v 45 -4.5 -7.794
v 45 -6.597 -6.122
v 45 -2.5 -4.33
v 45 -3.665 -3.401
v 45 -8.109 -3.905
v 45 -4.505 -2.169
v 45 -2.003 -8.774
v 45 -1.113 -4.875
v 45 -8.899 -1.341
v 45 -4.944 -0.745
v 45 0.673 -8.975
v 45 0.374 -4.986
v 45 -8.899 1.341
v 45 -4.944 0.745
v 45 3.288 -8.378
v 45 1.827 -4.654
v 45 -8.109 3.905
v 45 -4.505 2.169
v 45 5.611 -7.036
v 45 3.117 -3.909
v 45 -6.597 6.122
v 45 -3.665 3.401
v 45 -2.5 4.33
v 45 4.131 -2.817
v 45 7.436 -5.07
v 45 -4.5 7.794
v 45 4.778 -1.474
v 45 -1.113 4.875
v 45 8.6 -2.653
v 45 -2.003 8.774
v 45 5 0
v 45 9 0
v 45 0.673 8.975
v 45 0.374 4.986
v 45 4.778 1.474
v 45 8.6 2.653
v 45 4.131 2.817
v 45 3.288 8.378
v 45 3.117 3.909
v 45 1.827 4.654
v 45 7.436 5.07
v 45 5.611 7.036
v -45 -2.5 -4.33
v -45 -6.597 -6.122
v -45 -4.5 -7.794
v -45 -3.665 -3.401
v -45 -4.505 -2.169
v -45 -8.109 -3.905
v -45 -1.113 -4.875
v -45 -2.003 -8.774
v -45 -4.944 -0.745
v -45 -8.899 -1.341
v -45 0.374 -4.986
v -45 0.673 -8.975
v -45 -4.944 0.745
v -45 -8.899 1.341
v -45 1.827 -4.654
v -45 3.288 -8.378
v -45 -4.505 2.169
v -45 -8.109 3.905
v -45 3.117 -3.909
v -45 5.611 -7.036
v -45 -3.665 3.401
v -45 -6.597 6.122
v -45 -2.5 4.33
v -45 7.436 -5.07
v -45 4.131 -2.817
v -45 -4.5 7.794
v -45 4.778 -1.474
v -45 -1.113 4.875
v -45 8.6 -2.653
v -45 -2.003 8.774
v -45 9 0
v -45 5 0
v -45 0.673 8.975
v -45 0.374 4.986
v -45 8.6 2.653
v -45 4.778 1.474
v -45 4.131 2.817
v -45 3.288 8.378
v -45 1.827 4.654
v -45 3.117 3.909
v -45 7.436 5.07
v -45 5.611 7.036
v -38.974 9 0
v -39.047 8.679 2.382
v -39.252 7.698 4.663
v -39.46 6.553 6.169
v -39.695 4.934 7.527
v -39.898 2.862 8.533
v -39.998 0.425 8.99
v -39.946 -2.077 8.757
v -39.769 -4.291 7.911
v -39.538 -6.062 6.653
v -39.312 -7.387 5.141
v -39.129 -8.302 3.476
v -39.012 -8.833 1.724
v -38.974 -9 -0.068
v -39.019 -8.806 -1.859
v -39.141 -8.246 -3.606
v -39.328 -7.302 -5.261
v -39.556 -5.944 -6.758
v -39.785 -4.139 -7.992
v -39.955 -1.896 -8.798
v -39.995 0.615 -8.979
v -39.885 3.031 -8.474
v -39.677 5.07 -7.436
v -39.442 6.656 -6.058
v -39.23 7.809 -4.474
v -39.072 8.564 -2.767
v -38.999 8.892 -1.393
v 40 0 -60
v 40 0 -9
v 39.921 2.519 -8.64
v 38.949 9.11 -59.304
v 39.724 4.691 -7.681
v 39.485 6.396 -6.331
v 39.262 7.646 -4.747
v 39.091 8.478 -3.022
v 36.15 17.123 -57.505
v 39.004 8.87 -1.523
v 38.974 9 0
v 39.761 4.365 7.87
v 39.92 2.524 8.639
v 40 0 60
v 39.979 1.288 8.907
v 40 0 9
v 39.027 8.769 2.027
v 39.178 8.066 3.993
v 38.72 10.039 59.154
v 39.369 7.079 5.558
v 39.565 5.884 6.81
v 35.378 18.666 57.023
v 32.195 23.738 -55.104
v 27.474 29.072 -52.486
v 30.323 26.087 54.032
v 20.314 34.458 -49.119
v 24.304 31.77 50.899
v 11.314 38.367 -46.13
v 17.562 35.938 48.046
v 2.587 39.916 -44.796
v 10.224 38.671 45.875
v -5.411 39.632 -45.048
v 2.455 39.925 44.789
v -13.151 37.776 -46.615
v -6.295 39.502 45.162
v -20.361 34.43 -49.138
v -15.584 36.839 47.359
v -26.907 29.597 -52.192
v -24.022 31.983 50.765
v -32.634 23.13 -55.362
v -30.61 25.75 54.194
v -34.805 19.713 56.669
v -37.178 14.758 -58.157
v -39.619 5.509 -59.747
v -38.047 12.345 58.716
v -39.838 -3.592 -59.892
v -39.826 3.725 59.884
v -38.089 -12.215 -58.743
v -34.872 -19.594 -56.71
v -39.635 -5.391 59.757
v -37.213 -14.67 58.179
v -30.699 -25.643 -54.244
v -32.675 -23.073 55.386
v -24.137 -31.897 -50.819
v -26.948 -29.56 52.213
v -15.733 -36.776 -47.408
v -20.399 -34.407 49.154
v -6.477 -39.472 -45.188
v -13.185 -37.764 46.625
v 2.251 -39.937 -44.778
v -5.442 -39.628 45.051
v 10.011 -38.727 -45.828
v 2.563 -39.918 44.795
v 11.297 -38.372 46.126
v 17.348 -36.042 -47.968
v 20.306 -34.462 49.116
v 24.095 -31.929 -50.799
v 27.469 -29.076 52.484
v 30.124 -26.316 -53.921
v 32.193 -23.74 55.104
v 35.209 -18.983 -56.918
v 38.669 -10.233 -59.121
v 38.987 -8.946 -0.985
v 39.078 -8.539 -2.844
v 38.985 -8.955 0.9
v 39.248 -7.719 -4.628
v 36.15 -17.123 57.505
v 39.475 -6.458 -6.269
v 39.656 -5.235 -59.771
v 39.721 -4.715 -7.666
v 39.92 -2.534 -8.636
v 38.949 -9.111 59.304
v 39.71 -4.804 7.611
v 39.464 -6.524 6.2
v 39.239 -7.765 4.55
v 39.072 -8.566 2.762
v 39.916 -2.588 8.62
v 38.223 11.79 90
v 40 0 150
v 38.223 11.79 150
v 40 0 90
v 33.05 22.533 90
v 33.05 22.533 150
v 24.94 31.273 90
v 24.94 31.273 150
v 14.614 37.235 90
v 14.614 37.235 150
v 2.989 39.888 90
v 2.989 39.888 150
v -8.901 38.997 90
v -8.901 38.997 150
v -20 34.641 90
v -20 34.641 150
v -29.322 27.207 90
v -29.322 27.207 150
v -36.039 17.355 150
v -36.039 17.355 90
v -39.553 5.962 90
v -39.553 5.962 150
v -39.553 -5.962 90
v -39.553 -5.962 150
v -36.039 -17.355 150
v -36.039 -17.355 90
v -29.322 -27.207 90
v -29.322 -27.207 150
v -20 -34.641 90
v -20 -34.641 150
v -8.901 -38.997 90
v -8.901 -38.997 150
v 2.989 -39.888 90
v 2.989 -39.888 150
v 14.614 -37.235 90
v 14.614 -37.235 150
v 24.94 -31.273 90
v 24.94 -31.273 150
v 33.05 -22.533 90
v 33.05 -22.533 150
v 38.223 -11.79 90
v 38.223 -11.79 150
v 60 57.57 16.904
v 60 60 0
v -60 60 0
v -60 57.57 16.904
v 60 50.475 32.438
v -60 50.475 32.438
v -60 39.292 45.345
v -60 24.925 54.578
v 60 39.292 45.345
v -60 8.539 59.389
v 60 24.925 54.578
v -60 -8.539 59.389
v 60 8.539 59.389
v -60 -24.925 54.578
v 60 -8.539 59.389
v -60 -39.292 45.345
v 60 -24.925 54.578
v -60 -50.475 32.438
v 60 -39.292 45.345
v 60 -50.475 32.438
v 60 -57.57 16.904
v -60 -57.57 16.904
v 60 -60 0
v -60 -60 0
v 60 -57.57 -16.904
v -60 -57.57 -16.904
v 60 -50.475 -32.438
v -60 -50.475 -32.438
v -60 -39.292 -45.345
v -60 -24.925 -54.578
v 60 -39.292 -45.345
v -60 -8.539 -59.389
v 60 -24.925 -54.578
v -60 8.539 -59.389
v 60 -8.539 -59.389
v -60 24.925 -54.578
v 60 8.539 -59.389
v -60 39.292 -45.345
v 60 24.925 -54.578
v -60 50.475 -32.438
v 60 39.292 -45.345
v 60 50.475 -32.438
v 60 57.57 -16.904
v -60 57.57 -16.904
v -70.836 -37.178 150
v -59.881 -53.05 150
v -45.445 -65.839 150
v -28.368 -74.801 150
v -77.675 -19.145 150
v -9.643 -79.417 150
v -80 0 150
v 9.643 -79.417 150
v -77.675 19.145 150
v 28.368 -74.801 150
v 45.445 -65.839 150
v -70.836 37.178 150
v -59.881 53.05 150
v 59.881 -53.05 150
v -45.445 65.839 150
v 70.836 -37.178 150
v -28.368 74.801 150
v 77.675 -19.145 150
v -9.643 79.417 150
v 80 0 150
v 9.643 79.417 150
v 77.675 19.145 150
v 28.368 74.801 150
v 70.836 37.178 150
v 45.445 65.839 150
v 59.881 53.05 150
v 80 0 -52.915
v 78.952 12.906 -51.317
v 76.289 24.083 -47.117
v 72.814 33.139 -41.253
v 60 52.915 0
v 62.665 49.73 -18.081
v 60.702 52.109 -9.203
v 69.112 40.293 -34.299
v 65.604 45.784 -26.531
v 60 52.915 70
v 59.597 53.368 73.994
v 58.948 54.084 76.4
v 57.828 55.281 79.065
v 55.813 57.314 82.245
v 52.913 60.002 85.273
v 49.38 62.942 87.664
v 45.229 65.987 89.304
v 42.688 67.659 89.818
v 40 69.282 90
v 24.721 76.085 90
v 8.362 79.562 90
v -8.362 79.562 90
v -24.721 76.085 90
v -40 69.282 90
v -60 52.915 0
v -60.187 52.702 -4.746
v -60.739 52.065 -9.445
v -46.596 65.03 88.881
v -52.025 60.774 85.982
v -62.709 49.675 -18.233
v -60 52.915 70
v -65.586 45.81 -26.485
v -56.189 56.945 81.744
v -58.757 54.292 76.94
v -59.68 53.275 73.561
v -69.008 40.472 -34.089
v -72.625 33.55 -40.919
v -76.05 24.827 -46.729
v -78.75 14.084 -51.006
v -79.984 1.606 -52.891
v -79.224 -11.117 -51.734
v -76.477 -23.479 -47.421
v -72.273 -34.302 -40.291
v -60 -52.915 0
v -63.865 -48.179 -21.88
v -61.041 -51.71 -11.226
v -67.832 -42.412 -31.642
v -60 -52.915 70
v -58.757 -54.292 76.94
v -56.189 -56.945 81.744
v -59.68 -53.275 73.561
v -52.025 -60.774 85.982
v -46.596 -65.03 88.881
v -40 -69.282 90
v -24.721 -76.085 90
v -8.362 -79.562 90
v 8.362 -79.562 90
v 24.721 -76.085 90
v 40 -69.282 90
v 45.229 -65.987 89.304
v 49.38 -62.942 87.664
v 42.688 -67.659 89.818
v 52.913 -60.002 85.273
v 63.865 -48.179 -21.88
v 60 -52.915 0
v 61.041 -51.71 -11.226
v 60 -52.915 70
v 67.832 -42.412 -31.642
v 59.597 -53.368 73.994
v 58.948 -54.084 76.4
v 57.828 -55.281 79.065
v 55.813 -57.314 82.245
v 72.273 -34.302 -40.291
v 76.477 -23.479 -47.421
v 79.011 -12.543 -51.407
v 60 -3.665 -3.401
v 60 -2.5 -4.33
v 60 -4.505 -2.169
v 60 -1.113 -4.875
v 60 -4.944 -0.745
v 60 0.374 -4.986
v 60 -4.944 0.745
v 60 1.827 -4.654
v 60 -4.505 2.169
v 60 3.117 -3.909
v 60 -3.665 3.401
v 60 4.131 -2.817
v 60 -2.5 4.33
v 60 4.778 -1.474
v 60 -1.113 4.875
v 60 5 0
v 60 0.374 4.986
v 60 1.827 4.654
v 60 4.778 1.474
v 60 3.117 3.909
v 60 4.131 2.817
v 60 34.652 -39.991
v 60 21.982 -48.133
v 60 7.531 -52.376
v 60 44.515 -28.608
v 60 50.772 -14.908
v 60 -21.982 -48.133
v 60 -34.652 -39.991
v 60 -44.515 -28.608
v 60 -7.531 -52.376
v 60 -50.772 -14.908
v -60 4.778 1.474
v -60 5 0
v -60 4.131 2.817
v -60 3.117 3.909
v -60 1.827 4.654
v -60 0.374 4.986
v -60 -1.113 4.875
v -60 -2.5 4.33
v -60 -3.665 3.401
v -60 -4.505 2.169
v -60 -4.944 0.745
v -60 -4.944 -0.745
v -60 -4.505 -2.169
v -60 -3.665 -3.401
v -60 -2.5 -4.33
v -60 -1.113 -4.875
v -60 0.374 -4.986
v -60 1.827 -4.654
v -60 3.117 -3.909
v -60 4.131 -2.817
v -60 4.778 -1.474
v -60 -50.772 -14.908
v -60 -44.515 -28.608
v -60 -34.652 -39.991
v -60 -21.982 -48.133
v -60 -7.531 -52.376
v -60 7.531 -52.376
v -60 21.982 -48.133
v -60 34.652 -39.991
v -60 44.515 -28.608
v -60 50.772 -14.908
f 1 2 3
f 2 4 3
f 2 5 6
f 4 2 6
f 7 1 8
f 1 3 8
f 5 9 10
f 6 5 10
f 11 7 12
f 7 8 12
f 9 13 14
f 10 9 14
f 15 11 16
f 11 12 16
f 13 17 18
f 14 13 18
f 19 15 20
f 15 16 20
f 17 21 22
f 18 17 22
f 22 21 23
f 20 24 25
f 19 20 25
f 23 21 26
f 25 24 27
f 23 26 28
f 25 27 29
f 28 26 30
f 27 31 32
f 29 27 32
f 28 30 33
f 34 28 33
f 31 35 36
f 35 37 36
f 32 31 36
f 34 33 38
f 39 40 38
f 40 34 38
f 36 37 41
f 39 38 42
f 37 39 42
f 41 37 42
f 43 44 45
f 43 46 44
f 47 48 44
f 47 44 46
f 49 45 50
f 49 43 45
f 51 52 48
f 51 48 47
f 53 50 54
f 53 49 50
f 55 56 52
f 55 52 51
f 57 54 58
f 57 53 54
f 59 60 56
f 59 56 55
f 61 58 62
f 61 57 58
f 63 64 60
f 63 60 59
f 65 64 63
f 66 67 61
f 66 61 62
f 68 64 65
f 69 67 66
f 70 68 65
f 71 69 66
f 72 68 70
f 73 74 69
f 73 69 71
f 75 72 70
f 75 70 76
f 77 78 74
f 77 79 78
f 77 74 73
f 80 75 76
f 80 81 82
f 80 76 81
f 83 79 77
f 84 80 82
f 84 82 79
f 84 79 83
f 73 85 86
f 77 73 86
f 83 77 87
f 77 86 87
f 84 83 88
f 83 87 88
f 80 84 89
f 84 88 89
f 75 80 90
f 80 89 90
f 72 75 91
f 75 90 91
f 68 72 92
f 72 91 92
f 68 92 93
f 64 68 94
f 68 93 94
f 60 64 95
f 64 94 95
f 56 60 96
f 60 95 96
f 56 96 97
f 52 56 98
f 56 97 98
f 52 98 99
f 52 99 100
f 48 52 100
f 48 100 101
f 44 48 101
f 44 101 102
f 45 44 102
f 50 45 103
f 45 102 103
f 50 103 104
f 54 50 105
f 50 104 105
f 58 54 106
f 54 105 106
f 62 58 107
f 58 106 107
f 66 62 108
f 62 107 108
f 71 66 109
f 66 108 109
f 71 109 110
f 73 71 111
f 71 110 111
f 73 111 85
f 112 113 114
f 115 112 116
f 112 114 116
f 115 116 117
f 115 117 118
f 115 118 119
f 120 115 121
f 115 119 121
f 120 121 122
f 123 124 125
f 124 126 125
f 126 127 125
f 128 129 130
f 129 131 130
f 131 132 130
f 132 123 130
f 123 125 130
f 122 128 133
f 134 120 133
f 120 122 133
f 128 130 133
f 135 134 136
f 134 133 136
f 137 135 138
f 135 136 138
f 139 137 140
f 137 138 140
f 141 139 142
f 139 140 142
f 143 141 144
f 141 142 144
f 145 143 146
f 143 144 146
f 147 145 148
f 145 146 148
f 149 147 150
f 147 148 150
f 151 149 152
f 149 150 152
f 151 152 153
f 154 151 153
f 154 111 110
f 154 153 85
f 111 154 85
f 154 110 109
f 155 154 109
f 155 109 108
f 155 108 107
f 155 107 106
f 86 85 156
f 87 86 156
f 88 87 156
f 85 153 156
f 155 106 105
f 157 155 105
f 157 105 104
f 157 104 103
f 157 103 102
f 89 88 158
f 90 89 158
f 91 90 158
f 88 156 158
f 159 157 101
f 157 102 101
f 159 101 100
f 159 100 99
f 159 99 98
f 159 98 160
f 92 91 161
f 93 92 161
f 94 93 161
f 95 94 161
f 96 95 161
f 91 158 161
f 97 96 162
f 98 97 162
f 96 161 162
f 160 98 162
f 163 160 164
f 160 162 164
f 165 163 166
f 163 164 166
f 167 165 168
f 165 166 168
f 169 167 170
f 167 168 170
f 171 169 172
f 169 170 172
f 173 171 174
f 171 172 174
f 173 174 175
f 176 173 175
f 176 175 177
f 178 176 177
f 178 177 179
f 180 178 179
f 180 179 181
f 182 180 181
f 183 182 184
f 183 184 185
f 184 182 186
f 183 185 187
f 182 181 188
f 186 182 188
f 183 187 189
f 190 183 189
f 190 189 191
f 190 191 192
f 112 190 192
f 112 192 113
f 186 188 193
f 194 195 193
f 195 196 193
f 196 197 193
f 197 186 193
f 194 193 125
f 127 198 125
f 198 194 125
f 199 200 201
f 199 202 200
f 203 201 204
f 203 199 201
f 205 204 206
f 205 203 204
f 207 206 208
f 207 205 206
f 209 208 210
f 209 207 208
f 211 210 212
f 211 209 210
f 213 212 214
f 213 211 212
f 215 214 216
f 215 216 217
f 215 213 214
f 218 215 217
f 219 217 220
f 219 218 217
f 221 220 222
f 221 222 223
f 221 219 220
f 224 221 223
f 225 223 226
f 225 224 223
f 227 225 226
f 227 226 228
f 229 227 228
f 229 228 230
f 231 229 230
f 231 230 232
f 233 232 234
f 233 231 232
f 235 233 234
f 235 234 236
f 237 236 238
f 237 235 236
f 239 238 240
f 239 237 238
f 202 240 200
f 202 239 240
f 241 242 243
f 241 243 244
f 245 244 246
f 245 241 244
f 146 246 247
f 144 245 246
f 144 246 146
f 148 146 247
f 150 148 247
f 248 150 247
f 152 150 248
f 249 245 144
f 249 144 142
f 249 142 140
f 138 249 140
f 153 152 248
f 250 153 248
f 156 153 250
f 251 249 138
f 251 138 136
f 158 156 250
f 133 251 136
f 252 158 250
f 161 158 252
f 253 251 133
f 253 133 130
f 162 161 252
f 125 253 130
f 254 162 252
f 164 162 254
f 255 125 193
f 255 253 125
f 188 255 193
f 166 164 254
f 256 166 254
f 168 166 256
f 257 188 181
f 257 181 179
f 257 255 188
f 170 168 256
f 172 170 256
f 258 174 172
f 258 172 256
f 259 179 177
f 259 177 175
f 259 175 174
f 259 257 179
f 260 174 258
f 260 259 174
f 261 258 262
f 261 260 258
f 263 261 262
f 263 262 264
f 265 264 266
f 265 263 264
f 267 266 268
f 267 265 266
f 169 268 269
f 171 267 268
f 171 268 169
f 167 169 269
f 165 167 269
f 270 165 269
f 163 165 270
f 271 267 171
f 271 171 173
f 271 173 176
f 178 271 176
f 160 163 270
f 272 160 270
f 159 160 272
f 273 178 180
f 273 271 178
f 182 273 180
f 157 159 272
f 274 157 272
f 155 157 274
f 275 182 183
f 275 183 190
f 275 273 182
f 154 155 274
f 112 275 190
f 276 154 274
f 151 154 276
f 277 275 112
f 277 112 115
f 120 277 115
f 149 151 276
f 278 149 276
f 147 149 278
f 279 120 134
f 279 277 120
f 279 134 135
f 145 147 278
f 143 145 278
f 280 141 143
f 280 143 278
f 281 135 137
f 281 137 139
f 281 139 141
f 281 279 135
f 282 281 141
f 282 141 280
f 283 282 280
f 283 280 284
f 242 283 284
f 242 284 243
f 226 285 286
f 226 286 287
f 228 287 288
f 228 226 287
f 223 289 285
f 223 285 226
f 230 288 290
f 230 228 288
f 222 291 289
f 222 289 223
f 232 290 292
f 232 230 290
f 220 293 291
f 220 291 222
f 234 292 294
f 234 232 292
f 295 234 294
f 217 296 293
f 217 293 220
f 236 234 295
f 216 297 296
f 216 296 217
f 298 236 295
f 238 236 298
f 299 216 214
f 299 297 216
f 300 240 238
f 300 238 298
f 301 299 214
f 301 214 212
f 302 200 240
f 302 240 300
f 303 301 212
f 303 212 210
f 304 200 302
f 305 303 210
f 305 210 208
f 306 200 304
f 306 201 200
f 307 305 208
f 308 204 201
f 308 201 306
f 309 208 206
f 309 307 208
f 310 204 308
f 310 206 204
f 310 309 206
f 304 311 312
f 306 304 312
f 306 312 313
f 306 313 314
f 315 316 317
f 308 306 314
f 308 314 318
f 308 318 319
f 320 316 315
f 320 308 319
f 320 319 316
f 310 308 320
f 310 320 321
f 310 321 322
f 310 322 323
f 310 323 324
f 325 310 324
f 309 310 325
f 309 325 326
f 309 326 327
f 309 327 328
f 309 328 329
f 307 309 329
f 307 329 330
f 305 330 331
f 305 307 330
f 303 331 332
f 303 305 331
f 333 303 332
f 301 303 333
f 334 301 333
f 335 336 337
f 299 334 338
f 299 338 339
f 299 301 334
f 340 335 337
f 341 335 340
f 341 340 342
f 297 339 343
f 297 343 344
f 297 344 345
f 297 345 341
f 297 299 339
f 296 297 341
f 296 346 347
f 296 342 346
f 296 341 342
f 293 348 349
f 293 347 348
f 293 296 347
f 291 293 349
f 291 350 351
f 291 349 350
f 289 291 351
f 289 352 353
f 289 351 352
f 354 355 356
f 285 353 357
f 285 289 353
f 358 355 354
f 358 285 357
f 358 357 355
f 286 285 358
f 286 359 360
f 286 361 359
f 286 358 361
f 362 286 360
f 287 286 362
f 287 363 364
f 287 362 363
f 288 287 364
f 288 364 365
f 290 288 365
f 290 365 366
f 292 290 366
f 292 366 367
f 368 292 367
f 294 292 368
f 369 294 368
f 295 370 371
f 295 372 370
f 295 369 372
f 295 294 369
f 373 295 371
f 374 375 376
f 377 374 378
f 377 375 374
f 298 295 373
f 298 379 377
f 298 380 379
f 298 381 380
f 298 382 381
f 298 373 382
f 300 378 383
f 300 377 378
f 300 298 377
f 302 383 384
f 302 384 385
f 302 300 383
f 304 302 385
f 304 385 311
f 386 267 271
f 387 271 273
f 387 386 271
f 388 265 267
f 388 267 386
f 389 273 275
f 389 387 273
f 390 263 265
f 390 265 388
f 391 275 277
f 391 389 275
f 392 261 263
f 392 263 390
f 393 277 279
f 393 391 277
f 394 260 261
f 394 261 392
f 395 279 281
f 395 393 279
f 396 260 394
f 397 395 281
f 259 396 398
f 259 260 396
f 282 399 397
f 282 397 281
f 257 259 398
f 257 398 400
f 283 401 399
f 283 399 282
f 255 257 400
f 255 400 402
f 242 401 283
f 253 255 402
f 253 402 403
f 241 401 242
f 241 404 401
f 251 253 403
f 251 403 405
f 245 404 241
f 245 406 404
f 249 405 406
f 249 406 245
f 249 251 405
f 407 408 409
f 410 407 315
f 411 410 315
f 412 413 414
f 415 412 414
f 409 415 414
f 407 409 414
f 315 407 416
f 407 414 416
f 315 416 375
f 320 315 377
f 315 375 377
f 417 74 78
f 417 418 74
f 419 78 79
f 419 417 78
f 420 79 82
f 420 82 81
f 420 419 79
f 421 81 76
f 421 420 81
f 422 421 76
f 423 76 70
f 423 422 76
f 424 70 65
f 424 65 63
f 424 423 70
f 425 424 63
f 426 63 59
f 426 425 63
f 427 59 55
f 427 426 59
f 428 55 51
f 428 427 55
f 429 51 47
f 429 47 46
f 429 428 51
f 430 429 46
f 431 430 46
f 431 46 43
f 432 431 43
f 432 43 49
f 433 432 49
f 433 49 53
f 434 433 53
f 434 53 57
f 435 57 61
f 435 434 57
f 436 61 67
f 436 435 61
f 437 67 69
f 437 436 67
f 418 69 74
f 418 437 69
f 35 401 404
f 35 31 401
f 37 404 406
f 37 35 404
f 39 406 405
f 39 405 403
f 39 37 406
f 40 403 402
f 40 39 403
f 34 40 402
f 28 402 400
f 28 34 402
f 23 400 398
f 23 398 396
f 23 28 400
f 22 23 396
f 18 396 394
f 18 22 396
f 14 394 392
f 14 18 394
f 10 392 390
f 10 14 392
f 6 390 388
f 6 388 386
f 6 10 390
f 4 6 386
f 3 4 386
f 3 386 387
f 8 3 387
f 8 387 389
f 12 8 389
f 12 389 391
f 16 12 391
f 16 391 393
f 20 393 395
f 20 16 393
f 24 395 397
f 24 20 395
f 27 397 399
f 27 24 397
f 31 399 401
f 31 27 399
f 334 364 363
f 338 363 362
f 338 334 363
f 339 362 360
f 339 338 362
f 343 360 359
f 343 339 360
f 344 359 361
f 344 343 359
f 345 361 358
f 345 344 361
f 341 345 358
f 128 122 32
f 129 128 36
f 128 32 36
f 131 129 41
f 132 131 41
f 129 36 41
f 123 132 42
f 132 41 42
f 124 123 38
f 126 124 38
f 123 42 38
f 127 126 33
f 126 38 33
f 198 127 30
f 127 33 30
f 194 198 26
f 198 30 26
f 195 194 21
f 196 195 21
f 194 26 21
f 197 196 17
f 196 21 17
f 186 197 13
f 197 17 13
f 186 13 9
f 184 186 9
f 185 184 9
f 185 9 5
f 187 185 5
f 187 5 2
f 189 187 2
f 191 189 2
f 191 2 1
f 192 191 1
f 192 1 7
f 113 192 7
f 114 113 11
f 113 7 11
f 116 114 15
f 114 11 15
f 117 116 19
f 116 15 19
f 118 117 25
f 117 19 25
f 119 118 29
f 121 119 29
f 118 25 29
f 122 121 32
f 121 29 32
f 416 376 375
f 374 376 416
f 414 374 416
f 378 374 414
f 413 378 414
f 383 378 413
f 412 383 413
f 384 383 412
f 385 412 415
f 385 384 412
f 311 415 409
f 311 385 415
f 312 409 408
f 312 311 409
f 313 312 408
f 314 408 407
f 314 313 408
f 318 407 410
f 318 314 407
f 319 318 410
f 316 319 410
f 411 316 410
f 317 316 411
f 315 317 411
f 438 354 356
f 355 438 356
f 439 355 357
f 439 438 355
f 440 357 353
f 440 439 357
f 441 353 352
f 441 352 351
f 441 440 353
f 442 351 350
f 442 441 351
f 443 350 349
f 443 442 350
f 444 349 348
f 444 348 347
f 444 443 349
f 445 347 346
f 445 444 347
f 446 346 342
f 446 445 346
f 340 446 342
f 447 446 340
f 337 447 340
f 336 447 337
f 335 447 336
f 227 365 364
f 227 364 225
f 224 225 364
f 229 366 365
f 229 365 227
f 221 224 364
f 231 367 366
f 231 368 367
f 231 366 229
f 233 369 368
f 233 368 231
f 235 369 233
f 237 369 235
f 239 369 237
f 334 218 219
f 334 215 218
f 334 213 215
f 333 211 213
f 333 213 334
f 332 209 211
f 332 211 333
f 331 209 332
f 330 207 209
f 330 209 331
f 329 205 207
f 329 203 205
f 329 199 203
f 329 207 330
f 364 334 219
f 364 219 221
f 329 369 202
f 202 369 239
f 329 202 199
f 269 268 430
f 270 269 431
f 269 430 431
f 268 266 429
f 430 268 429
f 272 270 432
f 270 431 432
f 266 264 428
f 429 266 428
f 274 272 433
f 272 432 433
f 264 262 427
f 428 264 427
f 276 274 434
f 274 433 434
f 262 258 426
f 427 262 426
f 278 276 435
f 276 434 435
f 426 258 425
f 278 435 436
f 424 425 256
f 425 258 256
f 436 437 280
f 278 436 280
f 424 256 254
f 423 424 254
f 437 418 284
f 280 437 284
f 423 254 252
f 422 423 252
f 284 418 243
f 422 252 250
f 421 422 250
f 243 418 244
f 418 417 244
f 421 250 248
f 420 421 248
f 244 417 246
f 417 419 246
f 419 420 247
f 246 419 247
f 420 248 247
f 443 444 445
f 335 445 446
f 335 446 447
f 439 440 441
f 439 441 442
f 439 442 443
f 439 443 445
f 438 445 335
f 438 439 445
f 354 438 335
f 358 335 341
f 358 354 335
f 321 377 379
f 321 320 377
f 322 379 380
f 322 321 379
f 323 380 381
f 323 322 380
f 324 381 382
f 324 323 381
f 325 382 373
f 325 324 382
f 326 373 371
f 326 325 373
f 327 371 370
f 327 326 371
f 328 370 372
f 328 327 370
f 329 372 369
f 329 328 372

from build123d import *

# Parameters (mm, degrees)
F8_R           = 40
F9_DEPTH       = 60
F0_R           = 60
F0_R_2         = 9
F0_R_3         = 5
F1_DEPTH       = 60
F10_DEPTH      = 45
F8_R_2         = 80
F3_DEPTH       = 150
F3_DEPTH_BACK  = 60
F4_W           = 105.8300524426
F4_H           = 30
F11_DEPTH      = 25
F11_DEPTH_BACK = 145
F6_W           = 120
F6_H           = 150
F7_DEPTH       = 105.8300524426
F12_R          = 19.99999


# Not quite as in the source:
# - a fillet or chamfer is up to 0.001 mm smaller than in the source, because OpenCascade refuses the exact size


with BuildPart() as f9:
    # F8 (on Top) → F9 (new body, symmetric)
    with BuildSketch(Plane.XY):
        Circle(F8_R)
    extrude(amount=F9_DEPTH, both=True)


with BuildPart() as f1:
    # F0 (on Right) → F1 (new body, symmetric)
    with BuildSketch(Plane.YZ):
        Circle(F0_R)
        Circle(F0_R_2, mode=Mode.SUBTRACT)
        Circle(F0_R_2)
        Circle(F0_R_3, mode=Mode.SUBTRACT)
    extrude(amount=F1_DEPTH, both=True)

    # F2: cut F9
    add(f9.part, mode=Mode.SUBTRACT)

    # F0 (on Right) → F10 (cut, symmetric)
    with BuildSketch(Plane.YZ):
        Circle(F0_R_2)
        Circle(F0_R_3, mode=Mode.SUBTRACT)
    extrude(amount=F10_DEPTH, both=True, mode=Mode.SUBTRACT)


with BuildPart() as f3:
    # F8 (on Top) → F3 (new body, two sides)
    with BuildSketch(Plane.XY) as f3_sk:
        Circle(F8_R_2)
        Circle(F8_R, mode=Mode.SUBTRACT)
    extrude(amount=F3_DEPTH)
    extrude(f3_sk.sketch, amount=-F3_DEPTH_BACK)


with BuildPart() as f11:
    # F4 (on face) → F11 (new body, two sides)
    with BuildSketch(Plane.YZ.offset(60)) as f11_sk:
        with BuildLine():
            Line((-52.9150262213, 0), (52.9150262213, 0))
            ThreePointArc((52.9150262213, 0), (0, 52.9150262213), (-52.9150262213, 0))
        make_face()
        with BuildLine():
            ThreePointArc((-52.9150262213, 0), (0, -52.9150262213), (52.9150262213, 0))
            Line((52.9150262213, 0), (-52.9150262213, 0))
        make_face()
        with BuildLine():
            ThreePointArc((-52.9150262213, 0), (0, 52.9150262213), (52.9150262213, 0))
            Line((52.9150262213, 0), (52.9150262213, 90))
            Line((52.9150262213, 90), (-52.9150262213, 90))
            Line((-52.9150262213, 90), (-52.9150262213, 0))
        make_face()
        with Locations((0, 105)):
            Rectangle(F4_W, F4_H)
        Polygon((52.9150262213, 120), (52.9150262213, 90), (90, 90), (90, 150), (-90, 150), (-90, 90), (-52.9150262213, 90), (-52.9150262213, 120), align=None)
    extrude(amount=F11_DEPTH)
    extrude(f11_sk.sketch, amount=-F11_DEPTH_BACK)


with BuildPart() as f3_1:
    add(f3.part)

    # F5: intersect F11
    add(f11.part, mode=Mode.INTERSECT)

    # F6 (on face) → F7 (cut, through all)
    with BuildSketch(Plane.XZ.offset(52.9150262213)):
        with Locations((0, 15)):
            Rectangle(F6_W, F6_H)
    extrude(amount=-F7_DEPTH, mode=Mode.SUBTRACT)

    # F12 (radius 20 in the source; OpenCascade refuses exactly that, so slightly less here)
    f12_edges = [f3_1.edges().sort_by_distance(p)[0] for p in [
        (-60, 0, 90),
        (60, 0, 90),
    ]]
    fillet(f12_edges, radius=F12_R)


solid = Compound([f1.part, f3_1.part])
